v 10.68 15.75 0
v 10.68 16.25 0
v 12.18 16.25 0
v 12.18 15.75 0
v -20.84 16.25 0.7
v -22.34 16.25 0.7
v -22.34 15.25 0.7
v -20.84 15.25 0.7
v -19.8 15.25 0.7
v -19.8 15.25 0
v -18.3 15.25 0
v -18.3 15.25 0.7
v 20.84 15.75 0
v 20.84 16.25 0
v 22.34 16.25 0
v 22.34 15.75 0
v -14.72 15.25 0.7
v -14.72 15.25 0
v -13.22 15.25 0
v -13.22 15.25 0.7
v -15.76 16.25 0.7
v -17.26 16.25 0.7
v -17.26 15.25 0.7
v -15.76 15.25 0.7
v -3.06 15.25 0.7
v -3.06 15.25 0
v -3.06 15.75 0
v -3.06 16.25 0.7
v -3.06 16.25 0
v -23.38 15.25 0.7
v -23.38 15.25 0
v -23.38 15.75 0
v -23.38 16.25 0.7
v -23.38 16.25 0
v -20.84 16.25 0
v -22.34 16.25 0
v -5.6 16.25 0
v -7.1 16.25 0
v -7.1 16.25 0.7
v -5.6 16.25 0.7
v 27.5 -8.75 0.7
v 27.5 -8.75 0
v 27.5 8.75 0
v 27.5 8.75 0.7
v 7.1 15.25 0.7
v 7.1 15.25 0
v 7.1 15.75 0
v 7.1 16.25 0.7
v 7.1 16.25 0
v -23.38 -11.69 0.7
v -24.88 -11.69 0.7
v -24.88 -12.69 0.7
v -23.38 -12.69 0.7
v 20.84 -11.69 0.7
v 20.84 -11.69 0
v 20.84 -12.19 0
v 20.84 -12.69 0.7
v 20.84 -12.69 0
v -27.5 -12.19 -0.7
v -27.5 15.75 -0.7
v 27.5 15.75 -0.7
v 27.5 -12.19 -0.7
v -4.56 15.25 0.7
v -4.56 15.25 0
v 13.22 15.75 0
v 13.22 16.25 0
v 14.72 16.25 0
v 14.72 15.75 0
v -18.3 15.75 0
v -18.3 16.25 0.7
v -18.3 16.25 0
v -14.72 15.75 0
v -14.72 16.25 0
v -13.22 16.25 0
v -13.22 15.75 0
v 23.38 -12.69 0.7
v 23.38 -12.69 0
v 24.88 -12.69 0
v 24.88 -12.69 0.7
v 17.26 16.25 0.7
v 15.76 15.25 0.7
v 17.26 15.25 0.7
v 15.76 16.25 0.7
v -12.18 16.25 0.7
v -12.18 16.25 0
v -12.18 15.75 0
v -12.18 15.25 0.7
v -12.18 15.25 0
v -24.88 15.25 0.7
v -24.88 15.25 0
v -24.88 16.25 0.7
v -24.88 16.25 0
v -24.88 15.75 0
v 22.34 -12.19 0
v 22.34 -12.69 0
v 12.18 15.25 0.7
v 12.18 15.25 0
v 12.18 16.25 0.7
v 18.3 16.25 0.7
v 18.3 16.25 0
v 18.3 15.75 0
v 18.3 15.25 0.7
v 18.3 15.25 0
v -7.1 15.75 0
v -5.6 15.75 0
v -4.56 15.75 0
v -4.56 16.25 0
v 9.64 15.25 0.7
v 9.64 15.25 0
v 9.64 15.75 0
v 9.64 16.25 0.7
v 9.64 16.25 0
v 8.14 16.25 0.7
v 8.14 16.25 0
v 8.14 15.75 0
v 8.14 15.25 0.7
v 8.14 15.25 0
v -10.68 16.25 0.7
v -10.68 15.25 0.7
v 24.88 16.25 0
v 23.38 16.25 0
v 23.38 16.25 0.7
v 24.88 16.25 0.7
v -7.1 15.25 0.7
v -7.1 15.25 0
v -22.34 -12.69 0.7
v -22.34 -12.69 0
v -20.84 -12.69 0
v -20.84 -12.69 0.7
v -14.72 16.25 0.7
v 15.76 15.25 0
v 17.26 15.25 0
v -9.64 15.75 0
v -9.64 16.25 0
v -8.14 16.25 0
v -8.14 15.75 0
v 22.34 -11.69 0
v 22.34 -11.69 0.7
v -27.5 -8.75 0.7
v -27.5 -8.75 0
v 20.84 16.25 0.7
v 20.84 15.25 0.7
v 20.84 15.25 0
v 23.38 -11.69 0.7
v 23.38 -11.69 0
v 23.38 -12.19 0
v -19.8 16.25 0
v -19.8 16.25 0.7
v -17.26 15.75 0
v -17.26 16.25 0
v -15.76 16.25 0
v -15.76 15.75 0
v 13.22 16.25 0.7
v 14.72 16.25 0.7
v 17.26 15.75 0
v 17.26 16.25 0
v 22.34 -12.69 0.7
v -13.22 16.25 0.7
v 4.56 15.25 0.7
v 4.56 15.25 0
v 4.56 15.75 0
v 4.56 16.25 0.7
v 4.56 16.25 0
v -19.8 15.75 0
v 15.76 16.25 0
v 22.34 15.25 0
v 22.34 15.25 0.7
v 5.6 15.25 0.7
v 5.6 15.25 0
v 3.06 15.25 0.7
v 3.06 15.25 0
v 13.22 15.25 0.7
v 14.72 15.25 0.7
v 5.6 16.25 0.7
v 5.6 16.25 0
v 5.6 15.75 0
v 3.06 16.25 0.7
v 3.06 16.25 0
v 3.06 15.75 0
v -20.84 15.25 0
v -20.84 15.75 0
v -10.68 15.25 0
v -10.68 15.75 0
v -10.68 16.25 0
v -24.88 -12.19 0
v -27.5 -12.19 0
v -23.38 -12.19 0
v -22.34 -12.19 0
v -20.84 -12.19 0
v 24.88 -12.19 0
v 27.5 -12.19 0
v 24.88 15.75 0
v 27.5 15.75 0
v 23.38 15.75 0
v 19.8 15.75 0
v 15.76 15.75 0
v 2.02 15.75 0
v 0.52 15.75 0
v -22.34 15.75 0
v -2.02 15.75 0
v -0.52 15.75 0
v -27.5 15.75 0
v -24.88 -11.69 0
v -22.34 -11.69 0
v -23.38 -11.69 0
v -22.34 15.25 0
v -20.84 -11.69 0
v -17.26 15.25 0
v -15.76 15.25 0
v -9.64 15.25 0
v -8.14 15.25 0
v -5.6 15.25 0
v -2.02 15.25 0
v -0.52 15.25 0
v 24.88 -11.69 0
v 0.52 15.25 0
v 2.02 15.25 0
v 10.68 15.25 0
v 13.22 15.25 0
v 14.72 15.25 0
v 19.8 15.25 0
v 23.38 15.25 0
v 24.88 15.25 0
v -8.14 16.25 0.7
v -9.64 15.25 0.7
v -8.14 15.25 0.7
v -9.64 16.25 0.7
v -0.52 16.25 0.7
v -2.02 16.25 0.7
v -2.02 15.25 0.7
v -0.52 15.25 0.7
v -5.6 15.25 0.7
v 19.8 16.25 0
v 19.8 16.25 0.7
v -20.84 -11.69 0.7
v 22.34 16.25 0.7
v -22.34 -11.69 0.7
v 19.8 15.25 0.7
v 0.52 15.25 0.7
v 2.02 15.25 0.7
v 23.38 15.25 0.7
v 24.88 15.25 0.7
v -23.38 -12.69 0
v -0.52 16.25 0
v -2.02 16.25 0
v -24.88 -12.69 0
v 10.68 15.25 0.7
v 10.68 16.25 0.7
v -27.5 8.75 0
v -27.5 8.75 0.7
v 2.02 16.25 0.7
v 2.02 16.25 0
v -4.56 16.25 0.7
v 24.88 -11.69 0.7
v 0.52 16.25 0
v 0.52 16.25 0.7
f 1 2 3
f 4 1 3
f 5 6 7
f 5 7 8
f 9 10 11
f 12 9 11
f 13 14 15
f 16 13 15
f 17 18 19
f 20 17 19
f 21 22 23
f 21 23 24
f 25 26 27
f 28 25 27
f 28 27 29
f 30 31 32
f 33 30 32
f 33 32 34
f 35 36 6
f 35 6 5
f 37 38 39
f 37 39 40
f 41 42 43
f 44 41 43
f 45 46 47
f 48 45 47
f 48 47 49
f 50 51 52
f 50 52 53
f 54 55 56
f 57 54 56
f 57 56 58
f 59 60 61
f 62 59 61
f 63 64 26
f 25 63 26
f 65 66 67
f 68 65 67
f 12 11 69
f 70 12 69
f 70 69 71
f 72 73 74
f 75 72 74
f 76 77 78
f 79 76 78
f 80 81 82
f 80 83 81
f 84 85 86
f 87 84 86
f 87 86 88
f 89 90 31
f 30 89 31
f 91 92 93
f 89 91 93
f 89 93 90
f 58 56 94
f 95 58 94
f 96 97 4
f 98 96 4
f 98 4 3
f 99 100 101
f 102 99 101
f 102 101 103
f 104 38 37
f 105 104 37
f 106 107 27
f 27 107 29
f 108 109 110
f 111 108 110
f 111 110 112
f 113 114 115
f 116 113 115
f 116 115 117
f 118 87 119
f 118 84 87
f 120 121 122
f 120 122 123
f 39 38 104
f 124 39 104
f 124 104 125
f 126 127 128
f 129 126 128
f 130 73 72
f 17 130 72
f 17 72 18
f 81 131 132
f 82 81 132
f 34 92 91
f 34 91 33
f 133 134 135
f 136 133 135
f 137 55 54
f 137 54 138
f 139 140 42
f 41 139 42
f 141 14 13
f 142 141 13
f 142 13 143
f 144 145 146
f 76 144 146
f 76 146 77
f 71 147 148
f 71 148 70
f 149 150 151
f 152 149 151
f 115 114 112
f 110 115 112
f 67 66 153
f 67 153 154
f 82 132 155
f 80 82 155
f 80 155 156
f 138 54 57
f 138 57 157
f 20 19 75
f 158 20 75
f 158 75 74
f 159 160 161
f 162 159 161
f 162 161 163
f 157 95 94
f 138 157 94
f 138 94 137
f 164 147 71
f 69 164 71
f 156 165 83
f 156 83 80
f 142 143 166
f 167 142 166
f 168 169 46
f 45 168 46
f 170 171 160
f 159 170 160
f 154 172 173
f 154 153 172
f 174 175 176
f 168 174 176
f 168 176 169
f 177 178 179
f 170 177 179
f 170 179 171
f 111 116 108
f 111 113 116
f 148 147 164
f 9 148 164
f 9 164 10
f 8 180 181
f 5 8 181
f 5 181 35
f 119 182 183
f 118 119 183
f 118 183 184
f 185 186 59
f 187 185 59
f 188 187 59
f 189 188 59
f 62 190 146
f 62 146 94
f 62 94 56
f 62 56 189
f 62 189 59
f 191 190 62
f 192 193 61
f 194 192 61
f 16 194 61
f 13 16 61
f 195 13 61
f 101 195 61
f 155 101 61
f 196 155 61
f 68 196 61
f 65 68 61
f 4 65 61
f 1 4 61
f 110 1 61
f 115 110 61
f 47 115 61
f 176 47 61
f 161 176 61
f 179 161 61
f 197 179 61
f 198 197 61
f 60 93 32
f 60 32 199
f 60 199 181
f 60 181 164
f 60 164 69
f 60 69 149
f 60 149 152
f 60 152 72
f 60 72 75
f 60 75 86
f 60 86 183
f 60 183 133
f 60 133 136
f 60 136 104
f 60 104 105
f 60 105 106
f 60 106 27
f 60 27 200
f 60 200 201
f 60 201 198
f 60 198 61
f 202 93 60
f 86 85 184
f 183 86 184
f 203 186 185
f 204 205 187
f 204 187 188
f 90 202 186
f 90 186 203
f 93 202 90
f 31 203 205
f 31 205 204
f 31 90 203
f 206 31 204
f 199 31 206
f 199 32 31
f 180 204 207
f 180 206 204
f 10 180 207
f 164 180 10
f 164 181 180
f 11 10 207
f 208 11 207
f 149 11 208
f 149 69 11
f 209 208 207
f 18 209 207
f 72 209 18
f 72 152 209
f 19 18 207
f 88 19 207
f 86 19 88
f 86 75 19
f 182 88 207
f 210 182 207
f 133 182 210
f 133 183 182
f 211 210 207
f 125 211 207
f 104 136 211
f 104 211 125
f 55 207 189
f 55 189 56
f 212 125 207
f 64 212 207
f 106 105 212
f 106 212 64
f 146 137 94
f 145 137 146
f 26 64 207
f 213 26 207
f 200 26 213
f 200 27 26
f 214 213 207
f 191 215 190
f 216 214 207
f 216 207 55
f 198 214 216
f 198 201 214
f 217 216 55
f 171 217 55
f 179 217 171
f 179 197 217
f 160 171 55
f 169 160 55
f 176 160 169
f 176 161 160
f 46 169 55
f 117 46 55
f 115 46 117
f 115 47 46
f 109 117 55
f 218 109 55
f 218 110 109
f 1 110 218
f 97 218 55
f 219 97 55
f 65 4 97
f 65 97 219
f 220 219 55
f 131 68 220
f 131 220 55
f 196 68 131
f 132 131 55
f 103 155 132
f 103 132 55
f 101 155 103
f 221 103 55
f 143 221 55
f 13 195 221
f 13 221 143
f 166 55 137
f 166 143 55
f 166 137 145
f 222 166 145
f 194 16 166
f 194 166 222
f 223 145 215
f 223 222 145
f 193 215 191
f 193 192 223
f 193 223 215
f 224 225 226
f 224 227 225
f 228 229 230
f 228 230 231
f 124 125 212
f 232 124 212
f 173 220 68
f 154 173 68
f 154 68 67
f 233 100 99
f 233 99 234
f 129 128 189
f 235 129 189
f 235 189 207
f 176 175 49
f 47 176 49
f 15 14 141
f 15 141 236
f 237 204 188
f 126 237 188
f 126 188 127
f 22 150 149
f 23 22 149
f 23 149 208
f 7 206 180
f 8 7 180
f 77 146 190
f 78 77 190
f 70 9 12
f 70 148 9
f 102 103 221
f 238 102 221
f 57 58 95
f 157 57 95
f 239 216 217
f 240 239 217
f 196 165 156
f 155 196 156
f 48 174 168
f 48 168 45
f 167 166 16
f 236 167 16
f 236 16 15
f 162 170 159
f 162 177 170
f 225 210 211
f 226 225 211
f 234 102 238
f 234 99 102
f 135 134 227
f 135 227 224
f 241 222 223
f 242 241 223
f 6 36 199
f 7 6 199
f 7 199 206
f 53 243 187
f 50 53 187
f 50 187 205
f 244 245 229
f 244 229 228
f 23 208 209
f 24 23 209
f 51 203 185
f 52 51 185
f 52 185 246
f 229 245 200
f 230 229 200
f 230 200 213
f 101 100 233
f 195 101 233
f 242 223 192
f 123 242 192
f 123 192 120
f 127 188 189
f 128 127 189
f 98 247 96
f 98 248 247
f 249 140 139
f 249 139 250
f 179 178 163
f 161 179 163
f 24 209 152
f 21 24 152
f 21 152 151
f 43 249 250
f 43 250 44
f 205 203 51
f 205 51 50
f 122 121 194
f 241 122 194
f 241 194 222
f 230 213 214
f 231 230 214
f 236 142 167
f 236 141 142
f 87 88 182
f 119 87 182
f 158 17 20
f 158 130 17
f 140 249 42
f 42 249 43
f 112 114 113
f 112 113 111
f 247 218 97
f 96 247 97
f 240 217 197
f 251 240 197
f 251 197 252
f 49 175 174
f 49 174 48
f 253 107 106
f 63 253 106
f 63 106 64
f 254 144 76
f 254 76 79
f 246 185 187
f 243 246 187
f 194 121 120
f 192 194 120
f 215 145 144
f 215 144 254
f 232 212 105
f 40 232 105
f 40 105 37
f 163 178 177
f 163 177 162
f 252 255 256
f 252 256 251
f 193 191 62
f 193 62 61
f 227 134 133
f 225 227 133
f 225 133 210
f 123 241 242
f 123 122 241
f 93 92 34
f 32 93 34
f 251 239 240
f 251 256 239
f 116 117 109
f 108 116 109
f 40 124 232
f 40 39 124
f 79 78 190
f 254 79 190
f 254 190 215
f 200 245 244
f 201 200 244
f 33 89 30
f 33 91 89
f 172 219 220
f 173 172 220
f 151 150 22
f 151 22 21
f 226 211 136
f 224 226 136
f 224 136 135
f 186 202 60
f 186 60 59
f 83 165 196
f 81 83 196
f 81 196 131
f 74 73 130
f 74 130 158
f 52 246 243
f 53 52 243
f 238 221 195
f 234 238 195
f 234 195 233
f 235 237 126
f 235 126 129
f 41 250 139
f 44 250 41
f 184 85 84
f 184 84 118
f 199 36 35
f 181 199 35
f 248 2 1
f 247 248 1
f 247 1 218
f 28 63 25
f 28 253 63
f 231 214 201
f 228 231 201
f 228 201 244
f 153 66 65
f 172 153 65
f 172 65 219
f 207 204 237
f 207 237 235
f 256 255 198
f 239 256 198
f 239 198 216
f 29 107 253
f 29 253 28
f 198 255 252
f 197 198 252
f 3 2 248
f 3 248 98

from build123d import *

# Parameters (mm, degrees)
F0_W     = 1.5
F0_H     = 0.5
F0_W_2   = 55
F0_H_2   = 17.5
F0_W_3   = 48.17
F0_H_3   = 13.27
F1_DEPTH = 0.7
F2_DEPTH = 0.7
F3_DEPTH = 0.7


with BuildPart() as f1:
    # F0 (on Top) → F1 (new body)
    with BuildSketch(Plane.XY):
        with Locations((-24.13, 15.5)):
            Rectangle(F0_W, F0_H)
        Rectangle(F0_W_2, F0_H_2)
        Rectangle(F0_W_3, F0_H_3, mode=Mode.SUBTRACT)
        Polygon((27.5, -8.75), (-27.5, -8.75), (-27.5, -12.19), (-24.88, -12.19), (-24.88, -11.69), (-23.38, -11.69), (-23.38, -12.19), (-22.34, -12.19), (-22.34, -11.69), (-20.84, -11.69), (-20.84, -12.19), (20.84, -12.19), (20.84, -11.69), (22.34, -11.69), (22.34, -12.19), (23.38, -12.19), (23.38, -11.69), (24.88, -11.69), (24.88, -12.19), (27.5, -12.19), align=None)
        Rectangle(F0_W_3, F0_H_3)
        Polygon((-24.88, 15.75), (-27.5, 15.75), (-27.5, 8.75), (27.5, 8.75), (27.5, 15.75), (24.88, 15.75), (24.88, 15.25), (23.38, 15.25), (23.38, 15.75), (22.34, 15.75), (22.34, 15.25), (20.84, 15.25), (20.84, 15.75), (19.8, 15.75), (19.8, 15.25), (18.3, 15.25), (18.3, 15.75), (17.26, 15.75), (17.26, 15.25), (15.76, 15.25), (15.76, 15.75), (14.72, 15.75), (14.72, 15.25), (13.22, 15.25), (13.22, 15.75), (12.18, 15.75), (12.18, 15.25), (10.68, 15.25), (10.68, 15.75), (9.64, 15.75), (9.64, 15.25), (8.14, 15.25), (8.14, 15.75), (7.1, 15.75), (7.1, 15.25), (5.6, 15.25), (5.6, 15.75), (4.56, 15.75), (4.56, 15.25), (3.06, 15.25), (3.06, 15.75), (2.02, 15.75), (2.02, 15.25), (0.52, 15.25), (0.52, 15.75), (-0.52, 15.75), (-0.52, 15.25), (-2.02, 15.25), (-2.02, 15.75), (-3.06, 15.75), (-3.06, 15.25), (-4.56, 15.25), (-4.56, 15.75), (-5.6, 15.75), (-5.6, 15.25), (-7.1, 15.25), (-7.1, 15.75), (-8.14, 15.75), (-8.14, 15.25), (-9.64, 15.25), (-9.64, 15.75), (-10.68, 15.75), (-10.68, 15.25), (-12.18, 15.25), (-12.18, 15.75), (-13.22, 15.75), (-13.22, 15.25), (-14.72, 15.25), (-14.72, 15.75), (-15.76, 15.75), (-15.76, 15.25), (-17.26, 15.25), (-17.26, 15.75), (-18.3, 15.75), (-18.3, 15.25), (-19.8, 15.25), (-19.8, 15.75), (-20.84, 15.75), (-20.84, 15.25), (-22.34, 15.25), (-22.34, 15.75), (-23.38, 15.75), (-23.38, 15.25), (-24.88, 15.25), align=None)
        with Locations((-21.59, 15.5)):
            Rectangle(F0_W, F0_H)
        with Locations((-19.05, 15.5)):
            Rectangle(F0_W, F0_H)
        with Locations((-16.51, 15.5)):
            Rectangle(F0_W, F0_H)
        with Locations((-13.97, 15.5)):
            Rectangle(F0_W, F0_H)
        with Locations((-11.43, 15.5)):
            Rectangle(F0_W, F0_H)
        with Locations((-8.89, 15.5)):
            Rectangle(F0_W, F0_H)
        with Locations((-6.35, 15.5)):
            Rectangle(F0_W, F0_H)
        with Locations((-3.81, 15.5)):
            Rectangle(F0_W, F0_H)
        with Locations((-1.27, 15.5)):
            Rectangle(F0_W, F0_H)
        with Locations((1.27, 15.5)):
            Rectangle(F0_W, F0_H)
        with Locations((3.81, 15.5)):
            Rectangle(F0_W, F0_H)
        with Locations((6.35, 15.5)):
            Rectangle(F0_W, F0_H)
        with Locations((8.89, 15.5)):
            Rectangle(F0_W, F0_H)
        with Locations((11.43, 15.5)):
            Rectangle(F0_W, F0_H)
        with Locations((13.97, 15.5)):
            Rectangle(F0_W, F0_H)
        with Locations((16.51, 15.5)):
            Rectangle(F0_W, F0_H)
        with Locations((19.05, 15.5)):
            Rectangle(F0_W, F0_H)
        with Locations((21.59, 15.5)):
            Rectangle(F0_W, F0_H)
        with Locations((24.13, 15.5)):
            Rectangle(F0_W, F0_H)
        with Locations((24.13, -11.94)):
            Rectangle(F0_W, F0_H)
        with Locations((21.59, -11.94)):
            Rectangle(F0_W, F0_H)
        with Locations((-21.59, -11.94)):
            Rectangle(F0_W, F0_H)
        with Locations((-24.13, -11.94)):
            Rectangle(F0_W, F0_H)
    extrude(amount=-F1_DEPTH)

    # F0 (on Top) → F3 (join)
    with BuildSketch(Plane.XY):
        with Locations((-24.13, 15.5)):
            Rectangle(F0_W, F0_H)
        with Locations((-24.13, 16)):
            Rectangle(F0_W, F0_H)
        with Locations((-21.59, 16)):
            Rectangle(F0_W, F0_H)
        with Locations((-21.59, 15.5)):
            Rectangle(F0_W, F0_H)
        with Locations((-19.05, 15.5)):
            Rectangle(F0_W, F0_H)
        with Locations((-19.05, 16)):
            Rectangle(F0_W, F0_H)
        with Locations((-16.51, 16)):
            Rectangle(F0_W, F0_H)
        with Locations((-16.51, 15.5)):
            Rectangle(F0_W, F0_H)
        with Locations((-13.97, 15.5)):
            Rectangle(F0_W, F0_H)
        with Locations((-13.97, 16)):
            Rectangle(F0_W, F0_H)
        with Locations((-11.43, 15.5)):
            Rectangle(F0_W, F0_H)
        with Locations((-11.43, 16)):
            Rectangle(F0_W, F0_H)
        with Locations((-8.89, 15.5)):
            Rectangle(F0_W, F0_H)
        with Locations((-8.89, 16)):
            Rectangle(F0_W, F0_H)
        with Locations((-6.35, 15.5)):
            Rectangle(F0_W, F0_H)
        with Locations((-6.35, 16)):
            Rectangle(F0_W, F0_H)
        with Locations((-3.81, 15.5)):
            Rectangle(F0_W, F0_H)
        with Locations((-3.81, 16)):
            Rectangle(F0_W, F0_H)
        with Locations((-1.27, 16)):
            Rectangle(F0_W, F0_H)
        with Locations((-1.27, 15.5)):
            Rectangle(F0_W, F0_H)
        with Locations((1.27, 15.5)):
            Rectangle(F0_W, F0_H)
        with Locations((1.27, 16)):
            Rectangle(F0_W, F0_H)
        with Locations((3.81, 15.5)):
            Rectangle(F0_W, F0_H)
        with Locations((3.81, 16)):
            Rectangle(F0_W, F0_H)
        with Locations((6.35, 16)):
            Rectangle(F0_W, F0_H)
        with Locations((8.89, 15.5)):
            Rectangle(F0_W, F0_H)
        with Locations((8.89, 16)):
            Rectangle(F0_W, F0_H)
        with Locations((6.35, 15.5)):
            Rectangle(F0_W, F0_H)
        with Locations((11.43, 15.5)):
            Rectangle(F0_W, F0_H)
        with Locations((11.43, 16)):
            Rectangle(F0_W, F0_H)
        with Locations((13.97, 15.5)):
            Rectangle(F0_W, F0_H)
        with Locations((13.97, 16)):
            Rectangle(F0_W, F0_H)
        with Locations((16.51, 15.5)):
            Rectangle(F0_W, F0_H)
        with Locations((16.51, 16)):
            Rectangle(F0_W, F0_H)
        with Locations((19.05, 15.5)):
            Rectangle(F0_W, F0_H)
        with Locations((19.05, 16)):
            Rectangle(F0_W, F0_H)
        with Locations((21.59, 15.5)):
            Rectangle(F0_W, F0_H)
        with Locations((21.59, 16)):
            Rectangle(F0_W, F0_H)
        with Locations((24.13, 15.5)):
            Rectangle(F0_W, F0_H)
        with Locations((24.13, 16)):
            Rectangle(F0_W, F0_H)
        with Locations((24.13, -11.94)):
            Rectangle(F0_W, F0_H)
        with Locations((24.13, -12.44)):
            Rectangle(F0_W, F0_H)
        with Locations((21.59, -11.94)):
            Rectangle(F0_W, F0_H)
        with Locations((21.59, -12.44)):
            Rectangle(F0_W, F0_H)
        with Locations((-24.13, -11.94)):
            Rectangle(F0_W, F0_H)
        with Locations((-24.13, -12.44)):
            Rectangle(F0_W, F0_H)
        with Locations((-21.59, -11.94)):
            Rectangle(F0_W, F0_H)
        with Locations((-21.59, -12.44)):
            Rectangle(F0_W, F0_H)
    extrude(amount=F3_DEPTH)


with BuildPart() as f2:
    # F0 (on Top) → F2 (new body)
    with BuildSketch(Plane.XY):
        Rectangle(F0_W_2, F0_H_2)
        Rectangle(F0_W_3, F0_H_3, mode=Mode.SUBTRACT)
        Rectangle(F0_W_3, F0_H_3)
    extrude(amount=F2_DEPTH)


solid = Compound([f1.part, f2.part])
